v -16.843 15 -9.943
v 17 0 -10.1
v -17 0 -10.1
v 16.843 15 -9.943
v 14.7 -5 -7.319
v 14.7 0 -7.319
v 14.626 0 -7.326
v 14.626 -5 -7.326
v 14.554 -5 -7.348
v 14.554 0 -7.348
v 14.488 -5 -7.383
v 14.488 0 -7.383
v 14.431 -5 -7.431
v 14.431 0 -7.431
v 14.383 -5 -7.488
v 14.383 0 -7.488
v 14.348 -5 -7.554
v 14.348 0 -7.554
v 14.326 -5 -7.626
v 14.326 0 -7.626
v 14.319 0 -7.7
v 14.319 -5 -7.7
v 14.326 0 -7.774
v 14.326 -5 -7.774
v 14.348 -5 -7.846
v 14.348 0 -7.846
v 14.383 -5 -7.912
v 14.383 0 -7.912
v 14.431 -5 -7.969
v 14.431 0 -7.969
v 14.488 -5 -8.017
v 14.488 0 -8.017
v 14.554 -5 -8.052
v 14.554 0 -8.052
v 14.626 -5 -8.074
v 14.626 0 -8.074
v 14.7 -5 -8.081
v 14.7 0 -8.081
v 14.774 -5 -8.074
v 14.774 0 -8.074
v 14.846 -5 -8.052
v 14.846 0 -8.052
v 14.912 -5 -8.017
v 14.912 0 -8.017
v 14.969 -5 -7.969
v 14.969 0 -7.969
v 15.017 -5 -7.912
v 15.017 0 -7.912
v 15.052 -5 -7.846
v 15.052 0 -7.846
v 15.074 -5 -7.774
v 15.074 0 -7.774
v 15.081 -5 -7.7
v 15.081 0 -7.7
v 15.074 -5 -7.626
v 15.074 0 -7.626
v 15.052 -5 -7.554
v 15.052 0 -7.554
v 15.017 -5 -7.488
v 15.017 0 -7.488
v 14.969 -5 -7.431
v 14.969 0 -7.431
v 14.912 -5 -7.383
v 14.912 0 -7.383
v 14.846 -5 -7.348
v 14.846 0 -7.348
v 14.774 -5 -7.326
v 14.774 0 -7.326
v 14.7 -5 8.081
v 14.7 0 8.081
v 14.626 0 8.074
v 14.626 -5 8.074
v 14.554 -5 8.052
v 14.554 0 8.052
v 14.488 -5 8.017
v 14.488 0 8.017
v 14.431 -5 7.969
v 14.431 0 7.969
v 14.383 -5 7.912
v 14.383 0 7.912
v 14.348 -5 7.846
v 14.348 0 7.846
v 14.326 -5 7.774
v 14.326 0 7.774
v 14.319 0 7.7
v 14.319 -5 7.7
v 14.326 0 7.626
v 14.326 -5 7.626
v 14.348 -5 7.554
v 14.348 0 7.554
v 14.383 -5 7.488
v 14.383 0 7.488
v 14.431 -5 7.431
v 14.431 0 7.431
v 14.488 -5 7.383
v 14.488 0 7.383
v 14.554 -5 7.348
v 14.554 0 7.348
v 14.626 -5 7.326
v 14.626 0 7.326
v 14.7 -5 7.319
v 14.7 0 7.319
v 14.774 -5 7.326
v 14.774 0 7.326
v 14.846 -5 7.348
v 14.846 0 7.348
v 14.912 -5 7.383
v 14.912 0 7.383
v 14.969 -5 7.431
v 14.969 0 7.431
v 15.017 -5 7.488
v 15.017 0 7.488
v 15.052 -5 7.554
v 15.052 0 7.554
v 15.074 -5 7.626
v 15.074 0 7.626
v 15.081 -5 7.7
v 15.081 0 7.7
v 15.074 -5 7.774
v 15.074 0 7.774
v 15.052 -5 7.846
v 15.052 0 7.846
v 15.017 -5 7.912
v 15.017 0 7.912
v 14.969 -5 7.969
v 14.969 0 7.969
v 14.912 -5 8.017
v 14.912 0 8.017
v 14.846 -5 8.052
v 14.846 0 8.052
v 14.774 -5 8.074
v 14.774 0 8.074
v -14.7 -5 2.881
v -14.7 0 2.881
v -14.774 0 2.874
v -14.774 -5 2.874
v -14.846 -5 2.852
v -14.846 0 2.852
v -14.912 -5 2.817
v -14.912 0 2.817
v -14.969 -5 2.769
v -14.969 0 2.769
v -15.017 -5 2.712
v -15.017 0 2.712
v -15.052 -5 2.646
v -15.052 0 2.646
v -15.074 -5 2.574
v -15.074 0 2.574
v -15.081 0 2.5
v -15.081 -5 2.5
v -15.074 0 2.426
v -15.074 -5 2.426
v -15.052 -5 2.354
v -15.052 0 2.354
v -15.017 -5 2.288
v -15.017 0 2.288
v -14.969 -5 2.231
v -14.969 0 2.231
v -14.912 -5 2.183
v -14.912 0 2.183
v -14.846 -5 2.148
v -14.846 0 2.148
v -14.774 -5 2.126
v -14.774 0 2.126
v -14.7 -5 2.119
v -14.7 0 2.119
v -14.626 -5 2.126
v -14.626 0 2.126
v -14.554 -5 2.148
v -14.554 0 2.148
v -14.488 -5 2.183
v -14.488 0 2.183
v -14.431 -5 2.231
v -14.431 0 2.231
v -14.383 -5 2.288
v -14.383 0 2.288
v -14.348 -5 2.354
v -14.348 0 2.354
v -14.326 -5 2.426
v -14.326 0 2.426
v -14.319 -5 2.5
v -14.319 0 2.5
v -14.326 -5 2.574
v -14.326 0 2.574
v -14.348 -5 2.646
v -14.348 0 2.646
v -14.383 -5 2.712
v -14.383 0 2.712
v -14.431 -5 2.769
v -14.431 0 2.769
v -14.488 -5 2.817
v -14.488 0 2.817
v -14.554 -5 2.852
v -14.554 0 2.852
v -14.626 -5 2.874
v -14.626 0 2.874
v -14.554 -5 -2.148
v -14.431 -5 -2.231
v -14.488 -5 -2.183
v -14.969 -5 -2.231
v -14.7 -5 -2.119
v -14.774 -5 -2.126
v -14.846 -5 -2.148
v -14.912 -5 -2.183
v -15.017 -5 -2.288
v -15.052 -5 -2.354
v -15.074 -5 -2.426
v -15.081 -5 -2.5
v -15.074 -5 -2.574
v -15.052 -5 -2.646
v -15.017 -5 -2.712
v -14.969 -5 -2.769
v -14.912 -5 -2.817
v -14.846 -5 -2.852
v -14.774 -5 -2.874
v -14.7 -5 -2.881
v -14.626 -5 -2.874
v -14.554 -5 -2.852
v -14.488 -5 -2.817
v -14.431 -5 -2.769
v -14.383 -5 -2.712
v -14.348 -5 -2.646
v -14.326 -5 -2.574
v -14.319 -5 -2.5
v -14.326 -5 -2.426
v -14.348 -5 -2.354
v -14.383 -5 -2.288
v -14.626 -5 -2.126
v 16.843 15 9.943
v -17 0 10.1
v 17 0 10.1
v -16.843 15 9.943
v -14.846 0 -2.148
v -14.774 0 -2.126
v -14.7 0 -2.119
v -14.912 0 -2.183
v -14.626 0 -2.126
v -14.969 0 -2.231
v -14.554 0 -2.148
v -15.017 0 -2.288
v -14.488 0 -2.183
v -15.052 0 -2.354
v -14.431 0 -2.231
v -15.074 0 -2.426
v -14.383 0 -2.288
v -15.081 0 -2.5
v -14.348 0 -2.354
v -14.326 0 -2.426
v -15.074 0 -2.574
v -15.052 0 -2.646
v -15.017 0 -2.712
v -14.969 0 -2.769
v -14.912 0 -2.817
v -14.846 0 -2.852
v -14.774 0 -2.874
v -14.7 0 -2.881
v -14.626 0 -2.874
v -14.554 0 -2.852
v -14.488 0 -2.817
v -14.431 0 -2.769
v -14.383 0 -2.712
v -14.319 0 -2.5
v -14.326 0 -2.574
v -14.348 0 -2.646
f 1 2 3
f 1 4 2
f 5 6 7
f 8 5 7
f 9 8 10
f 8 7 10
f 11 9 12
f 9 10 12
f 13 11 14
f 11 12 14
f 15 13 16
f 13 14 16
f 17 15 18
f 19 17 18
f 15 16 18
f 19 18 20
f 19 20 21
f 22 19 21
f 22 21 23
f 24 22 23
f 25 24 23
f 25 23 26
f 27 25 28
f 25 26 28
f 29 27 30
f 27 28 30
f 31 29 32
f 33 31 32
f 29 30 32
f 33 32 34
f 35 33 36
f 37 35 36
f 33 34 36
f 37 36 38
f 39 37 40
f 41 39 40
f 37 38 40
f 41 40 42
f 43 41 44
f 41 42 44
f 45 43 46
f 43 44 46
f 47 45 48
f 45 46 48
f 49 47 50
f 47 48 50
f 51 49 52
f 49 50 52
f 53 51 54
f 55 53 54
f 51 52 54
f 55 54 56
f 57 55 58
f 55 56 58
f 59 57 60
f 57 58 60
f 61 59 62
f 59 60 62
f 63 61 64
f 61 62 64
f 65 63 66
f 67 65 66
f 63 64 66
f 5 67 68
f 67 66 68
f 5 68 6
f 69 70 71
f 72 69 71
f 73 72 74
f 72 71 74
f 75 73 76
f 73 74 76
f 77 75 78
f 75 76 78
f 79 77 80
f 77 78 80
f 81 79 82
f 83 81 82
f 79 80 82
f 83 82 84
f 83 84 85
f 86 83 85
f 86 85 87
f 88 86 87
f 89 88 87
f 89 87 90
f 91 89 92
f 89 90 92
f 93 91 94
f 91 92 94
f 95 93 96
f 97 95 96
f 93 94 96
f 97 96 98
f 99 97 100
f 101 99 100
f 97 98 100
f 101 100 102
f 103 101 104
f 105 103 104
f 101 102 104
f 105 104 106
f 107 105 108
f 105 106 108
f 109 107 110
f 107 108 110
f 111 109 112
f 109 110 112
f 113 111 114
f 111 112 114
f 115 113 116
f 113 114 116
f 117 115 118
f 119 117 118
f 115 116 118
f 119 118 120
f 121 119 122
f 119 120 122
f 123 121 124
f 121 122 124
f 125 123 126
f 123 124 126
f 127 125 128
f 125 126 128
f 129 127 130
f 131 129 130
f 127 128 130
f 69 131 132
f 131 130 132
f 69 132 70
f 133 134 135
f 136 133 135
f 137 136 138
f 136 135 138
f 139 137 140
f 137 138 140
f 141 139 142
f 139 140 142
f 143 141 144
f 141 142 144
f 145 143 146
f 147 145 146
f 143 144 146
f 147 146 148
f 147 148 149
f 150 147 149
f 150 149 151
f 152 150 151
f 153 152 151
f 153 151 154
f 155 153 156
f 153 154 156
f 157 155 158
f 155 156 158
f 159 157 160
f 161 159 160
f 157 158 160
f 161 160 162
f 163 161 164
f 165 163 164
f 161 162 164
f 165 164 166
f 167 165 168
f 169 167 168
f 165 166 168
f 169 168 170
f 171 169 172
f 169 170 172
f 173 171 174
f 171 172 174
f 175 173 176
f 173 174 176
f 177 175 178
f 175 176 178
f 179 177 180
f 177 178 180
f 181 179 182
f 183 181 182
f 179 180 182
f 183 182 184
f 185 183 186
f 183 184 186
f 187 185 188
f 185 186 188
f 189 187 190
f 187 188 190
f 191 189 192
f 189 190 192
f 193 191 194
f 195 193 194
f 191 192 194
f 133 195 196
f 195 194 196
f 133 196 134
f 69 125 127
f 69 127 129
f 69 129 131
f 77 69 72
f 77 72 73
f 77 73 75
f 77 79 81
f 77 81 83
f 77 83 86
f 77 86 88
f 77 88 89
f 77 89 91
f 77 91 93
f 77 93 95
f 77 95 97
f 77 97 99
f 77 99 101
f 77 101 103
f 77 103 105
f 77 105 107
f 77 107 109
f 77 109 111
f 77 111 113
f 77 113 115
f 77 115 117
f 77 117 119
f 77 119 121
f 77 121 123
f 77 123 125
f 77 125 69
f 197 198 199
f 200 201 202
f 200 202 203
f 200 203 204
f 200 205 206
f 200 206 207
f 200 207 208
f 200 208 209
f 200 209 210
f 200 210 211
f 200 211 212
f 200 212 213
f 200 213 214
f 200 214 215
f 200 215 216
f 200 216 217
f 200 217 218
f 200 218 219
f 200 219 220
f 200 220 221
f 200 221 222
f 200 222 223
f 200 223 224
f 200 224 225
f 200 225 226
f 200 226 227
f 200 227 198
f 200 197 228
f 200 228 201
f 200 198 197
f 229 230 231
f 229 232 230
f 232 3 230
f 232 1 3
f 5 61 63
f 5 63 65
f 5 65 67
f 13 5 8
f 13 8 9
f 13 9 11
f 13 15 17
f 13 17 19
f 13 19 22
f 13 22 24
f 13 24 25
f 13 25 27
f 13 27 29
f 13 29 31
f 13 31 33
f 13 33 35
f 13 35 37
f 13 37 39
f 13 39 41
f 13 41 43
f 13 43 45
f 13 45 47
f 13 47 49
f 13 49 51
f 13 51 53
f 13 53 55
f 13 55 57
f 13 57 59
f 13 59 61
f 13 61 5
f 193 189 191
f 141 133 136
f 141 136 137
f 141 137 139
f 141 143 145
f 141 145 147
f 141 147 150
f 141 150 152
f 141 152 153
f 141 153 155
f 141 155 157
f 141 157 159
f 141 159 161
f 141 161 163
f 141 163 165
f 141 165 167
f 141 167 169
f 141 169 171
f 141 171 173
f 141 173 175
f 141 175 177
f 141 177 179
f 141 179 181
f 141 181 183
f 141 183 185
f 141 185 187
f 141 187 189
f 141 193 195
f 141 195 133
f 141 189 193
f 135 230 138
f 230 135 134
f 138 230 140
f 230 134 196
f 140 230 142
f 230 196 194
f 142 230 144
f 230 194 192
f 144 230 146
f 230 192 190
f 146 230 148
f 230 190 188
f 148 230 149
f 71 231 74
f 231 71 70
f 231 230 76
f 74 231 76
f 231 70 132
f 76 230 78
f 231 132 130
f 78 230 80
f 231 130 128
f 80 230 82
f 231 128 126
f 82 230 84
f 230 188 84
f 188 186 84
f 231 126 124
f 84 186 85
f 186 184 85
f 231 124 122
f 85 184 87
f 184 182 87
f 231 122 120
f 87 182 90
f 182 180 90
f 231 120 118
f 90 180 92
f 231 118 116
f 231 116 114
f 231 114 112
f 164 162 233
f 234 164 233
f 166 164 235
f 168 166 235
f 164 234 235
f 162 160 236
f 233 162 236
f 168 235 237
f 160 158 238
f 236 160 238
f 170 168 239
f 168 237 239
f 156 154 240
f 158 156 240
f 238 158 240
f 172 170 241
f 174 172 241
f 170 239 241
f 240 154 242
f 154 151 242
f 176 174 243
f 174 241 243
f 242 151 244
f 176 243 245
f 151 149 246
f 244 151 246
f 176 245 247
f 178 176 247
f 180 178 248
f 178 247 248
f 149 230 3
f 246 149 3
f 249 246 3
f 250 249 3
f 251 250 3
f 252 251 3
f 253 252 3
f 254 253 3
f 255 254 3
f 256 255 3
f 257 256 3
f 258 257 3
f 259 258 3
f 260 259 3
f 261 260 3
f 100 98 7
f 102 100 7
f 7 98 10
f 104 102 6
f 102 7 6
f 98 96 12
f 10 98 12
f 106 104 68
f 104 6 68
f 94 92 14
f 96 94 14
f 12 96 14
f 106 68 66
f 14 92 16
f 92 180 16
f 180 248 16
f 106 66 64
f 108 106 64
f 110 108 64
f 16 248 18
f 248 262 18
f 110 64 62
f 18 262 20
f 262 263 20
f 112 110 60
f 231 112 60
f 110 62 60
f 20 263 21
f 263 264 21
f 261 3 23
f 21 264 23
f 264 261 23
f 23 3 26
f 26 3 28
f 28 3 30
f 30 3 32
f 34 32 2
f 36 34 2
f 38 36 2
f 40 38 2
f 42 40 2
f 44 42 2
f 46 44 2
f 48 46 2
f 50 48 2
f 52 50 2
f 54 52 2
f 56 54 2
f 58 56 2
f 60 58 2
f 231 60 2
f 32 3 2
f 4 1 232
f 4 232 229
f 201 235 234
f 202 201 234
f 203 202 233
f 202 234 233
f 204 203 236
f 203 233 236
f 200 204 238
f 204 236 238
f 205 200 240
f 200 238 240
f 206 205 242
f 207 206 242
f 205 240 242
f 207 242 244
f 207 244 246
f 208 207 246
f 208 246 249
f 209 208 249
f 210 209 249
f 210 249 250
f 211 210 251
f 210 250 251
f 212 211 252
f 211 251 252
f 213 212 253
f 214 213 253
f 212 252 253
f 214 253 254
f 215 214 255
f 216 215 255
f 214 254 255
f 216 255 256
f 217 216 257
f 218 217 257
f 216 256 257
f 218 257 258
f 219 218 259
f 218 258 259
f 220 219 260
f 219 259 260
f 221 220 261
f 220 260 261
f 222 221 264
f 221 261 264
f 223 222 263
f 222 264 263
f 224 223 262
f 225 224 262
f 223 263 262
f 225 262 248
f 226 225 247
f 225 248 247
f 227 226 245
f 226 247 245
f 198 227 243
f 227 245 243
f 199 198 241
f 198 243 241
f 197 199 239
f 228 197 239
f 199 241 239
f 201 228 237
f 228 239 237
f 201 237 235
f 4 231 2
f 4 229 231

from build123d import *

# Parameters (mm, degrees)
SKETCH1_W           = 34
SKETCH1_H           = 20.2
BOSS_EXTRUDE1_DEPTH = 15
BOSS_EXTRUDE1_TAPER = 0.6
SKETCH2_R           = 0.381
BOSS_EXTRUDE2_DEPTH = 5


with BuildPart() as part:
    # Sketch1 → Boss-Extrude1 (new body)
    with BuildSketch(Plane(origin=(0, 0, 0), x_dir=(1, 0, 0), z_dir=(0, 1, 0))):
        Rectangle(SKETCH1_W, SKETCH1_H)
    extrude(amount=BOSS_EXTRUDE1_DEPTH, taper=BOSS_EXTRUDE1_TAPER)

    # Sketch2 → Boss-Extrude2 (add)
    with BuildSketch(Plane.XZ):
        with Locations(Location((-14.7, 2.5, 0), (0, 0, 90))):
            Circle(SKETCH2_R)
        with Locations(Location((14.7, 7.7, 0), (0, 0, 90))):
            Circle(SKETCH2_R)
        with Locations(Location((14.7, -7.7, 0), (0, 0, 90))):
            Circle(SKETCH2_R)
        with Locations(Location((-14.7, -2.5, 0), (0, 0, 90))):
            Circle(SKETCH2_R)
    extrude(amount=BOSS_EXTRUDE2_DEPTH)


solid = part.part
